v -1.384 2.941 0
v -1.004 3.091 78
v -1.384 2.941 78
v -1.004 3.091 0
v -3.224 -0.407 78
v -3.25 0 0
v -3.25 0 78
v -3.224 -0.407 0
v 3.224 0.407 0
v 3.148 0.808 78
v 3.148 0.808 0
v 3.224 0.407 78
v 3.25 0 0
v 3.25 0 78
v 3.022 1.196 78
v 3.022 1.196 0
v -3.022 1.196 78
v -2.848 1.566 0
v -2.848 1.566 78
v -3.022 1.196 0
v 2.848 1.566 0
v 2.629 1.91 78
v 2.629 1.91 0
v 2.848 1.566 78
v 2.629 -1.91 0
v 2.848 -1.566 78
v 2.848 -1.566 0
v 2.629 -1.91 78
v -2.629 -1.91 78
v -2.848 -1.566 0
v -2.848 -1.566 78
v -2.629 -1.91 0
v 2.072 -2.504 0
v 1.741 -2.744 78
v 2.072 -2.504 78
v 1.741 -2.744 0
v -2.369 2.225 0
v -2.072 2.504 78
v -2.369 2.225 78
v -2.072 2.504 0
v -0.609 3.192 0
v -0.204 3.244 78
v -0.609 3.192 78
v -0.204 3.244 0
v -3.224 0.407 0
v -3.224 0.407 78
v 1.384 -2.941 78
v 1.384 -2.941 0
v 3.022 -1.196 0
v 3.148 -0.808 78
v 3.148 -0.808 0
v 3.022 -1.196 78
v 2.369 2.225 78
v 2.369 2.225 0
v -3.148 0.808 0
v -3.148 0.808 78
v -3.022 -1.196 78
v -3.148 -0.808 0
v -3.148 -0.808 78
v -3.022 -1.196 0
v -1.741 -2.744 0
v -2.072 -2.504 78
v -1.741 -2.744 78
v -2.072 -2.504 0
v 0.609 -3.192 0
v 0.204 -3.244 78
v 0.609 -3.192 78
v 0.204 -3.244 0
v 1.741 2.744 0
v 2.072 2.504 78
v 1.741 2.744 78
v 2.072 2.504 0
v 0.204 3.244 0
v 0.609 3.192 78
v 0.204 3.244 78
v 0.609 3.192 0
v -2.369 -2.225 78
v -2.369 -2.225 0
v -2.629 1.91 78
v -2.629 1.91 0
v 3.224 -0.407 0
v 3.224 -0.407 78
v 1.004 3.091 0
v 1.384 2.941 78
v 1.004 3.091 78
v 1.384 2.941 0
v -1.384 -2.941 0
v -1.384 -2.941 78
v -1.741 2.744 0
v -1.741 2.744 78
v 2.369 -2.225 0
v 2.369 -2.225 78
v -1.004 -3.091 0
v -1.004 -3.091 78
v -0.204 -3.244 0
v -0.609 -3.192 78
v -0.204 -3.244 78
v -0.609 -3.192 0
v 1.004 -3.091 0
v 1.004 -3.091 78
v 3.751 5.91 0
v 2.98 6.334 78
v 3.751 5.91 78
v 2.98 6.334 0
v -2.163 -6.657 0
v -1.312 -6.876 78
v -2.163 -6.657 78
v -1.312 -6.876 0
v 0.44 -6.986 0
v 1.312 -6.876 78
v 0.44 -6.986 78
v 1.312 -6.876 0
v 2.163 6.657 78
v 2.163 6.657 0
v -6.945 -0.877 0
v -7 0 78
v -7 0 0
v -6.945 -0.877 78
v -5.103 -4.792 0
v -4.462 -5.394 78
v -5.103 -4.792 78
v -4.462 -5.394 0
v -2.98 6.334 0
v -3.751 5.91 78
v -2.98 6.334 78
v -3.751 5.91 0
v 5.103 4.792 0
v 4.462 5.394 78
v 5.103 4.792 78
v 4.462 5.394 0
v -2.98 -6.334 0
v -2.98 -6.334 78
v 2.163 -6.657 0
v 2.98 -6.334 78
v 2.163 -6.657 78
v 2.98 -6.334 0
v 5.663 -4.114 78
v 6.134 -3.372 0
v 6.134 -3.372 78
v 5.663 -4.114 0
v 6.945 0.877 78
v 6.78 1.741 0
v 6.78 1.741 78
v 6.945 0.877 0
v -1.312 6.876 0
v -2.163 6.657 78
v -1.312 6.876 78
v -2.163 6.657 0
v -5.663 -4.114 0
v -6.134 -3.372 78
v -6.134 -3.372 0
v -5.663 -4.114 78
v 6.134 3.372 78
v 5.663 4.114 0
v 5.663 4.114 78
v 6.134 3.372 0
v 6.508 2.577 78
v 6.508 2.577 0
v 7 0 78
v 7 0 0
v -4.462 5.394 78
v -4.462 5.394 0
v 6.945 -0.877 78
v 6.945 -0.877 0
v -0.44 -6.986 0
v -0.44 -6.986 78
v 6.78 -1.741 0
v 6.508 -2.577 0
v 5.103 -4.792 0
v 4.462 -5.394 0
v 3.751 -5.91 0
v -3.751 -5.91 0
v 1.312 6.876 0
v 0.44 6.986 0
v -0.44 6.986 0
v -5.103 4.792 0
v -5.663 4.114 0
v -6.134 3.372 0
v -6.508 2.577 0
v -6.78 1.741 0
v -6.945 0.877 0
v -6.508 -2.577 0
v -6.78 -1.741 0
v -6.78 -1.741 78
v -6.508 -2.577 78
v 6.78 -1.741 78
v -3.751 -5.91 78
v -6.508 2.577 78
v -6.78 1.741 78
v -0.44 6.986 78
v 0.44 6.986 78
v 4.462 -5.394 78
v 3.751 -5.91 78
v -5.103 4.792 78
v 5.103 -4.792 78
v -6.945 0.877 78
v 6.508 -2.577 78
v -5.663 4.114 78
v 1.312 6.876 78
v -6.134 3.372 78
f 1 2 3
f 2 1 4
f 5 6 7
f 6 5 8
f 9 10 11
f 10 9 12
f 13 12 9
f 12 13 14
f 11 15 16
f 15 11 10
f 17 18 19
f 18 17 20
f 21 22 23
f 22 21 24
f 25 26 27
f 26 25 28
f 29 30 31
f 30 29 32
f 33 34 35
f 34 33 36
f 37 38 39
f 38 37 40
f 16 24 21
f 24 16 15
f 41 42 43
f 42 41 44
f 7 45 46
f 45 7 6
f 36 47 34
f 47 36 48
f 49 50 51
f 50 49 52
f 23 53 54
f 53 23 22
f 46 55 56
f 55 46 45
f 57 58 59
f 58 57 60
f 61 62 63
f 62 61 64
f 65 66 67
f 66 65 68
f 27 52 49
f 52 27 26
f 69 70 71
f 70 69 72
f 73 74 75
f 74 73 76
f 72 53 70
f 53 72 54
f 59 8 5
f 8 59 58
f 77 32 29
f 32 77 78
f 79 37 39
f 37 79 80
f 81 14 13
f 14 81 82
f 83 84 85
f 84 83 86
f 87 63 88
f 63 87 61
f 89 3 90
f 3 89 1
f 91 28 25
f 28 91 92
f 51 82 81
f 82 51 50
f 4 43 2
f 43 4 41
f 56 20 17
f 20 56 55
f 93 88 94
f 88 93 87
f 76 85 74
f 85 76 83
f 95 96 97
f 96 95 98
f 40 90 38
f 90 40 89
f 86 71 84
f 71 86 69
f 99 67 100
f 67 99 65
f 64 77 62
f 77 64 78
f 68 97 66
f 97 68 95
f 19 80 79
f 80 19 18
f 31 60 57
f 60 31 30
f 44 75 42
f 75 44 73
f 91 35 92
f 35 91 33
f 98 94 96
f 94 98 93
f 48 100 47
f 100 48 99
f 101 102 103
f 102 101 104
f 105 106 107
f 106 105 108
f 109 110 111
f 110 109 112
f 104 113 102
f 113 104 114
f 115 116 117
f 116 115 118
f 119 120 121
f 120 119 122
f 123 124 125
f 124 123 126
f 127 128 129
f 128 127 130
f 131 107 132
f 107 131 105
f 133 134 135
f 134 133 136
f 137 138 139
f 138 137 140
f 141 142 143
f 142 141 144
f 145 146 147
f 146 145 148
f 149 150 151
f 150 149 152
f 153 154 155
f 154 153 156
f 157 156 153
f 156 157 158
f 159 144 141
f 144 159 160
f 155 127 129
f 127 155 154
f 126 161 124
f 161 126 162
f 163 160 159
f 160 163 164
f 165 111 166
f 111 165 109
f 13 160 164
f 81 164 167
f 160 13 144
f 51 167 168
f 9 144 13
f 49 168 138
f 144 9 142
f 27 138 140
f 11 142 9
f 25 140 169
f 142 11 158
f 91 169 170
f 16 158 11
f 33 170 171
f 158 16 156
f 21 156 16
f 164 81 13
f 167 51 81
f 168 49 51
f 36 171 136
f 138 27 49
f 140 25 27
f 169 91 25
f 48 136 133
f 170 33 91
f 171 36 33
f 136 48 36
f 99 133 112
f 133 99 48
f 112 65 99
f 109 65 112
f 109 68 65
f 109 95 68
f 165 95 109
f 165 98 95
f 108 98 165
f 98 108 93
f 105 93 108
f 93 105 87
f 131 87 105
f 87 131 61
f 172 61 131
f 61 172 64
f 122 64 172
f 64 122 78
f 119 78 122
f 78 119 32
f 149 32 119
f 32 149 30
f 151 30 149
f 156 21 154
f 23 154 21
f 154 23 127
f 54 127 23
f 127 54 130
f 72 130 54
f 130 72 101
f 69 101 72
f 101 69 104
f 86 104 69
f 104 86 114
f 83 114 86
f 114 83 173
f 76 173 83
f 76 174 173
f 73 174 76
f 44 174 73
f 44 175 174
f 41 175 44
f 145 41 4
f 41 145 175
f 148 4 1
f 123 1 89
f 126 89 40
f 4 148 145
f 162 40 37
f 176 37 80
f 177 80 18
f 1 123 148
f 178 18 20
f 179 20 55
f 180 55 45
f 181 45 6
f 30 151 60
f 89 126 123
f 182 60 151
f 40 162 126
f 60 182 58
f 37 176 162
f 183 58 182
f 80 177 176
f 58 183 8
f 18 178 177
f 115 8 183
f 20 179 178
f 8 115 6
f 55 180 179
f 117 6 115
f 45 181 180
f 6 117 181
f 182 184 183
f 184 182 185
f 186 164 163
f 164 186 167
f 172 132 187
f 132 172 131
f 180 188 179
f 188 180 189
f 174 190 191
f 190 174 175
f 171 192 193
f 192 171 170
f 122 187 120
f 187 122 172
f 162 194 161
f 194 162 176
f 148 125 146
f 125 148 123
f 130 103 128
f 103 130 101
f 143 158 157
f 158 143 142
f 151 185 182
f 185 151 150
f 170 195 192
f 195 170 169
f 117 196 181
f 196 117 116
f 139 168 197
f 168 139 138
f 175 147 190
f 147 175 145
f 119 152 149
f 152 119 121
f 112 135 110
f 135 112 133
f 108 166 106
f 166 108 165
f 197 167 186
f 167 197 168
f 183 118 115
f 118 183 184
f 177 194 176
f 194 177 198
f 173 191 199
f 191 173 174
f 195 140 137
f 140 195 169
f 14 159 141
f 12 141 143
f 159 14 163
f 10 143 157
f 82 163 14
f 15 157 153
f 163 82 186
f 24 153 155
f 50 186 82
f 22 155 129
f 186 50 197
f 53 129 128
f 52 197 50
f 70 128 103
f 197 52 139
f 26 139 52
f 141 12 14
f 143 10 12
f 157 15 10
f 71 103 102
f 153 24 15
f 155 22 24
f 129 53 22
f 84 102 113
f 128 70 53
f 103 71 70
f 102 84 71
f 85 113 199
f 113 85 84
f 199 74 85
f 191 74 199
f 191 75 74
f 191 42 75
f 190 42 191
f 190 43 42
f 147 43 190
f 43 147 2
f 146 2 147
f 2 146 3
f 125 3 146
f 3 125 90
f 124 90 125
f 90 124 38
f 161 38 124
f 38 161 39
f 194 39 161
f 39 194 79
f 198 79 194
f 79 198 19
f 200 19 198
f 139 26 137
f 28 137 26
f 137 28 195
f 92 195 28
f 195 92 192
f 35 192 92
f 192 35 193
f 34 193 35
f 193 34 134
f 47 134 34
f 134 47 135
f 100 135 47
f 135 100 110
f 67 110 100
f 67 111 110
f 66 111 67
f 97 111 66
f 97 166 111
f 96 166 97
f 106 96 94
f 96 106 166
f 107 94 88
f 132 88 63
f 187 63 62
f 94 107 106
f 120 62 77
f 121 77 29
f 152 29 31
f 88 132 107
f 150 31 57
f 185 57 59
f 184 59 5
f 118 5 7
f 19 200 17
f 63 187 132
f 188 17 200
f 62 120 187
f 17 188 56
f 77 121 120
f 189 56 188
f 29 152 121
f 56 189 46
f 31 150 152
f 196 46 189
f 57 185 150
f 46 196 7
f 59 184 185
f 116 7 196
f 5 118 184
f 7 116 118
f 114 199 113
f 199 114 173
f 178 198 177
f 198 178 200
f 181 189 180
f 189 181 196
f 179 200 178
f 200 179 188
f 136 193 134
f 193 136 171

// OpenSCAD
$fn = 50;


difference() {
	union() {
		*color(alpha = 1.0000000000, c = "gray") {
			translate(v = [0, 7, 0]) {
				linear_extrude(height = 1) {
					text(font = "Arial:style=Bold", halign = "center", size = 4.5000000000, text = "COMMENT plate main", valign = "center");
				}
			}
		}
		cylinder(h = 78, r = 7.0000000000);
	}
	union() {
		*color(alpha = 1.0000000000, c = "gray") {
			translate(v = [0, 7, 0]) {
				linear_extrude(height = 1) {
					text(font = "Arial:style=Bold", halign = "center", size = 4.5000000000, text = "COMMENT holes main", valign = "center");
				}
			}
		}
		translate(v = [0, 0, -100]) {
			cylinder(h = 200, r = 3.2500000000);
		}
		translate(v = [0, 0, -100]) {
			cylinder(h = 200, r = 1.8000000000);
		}
	}
}
